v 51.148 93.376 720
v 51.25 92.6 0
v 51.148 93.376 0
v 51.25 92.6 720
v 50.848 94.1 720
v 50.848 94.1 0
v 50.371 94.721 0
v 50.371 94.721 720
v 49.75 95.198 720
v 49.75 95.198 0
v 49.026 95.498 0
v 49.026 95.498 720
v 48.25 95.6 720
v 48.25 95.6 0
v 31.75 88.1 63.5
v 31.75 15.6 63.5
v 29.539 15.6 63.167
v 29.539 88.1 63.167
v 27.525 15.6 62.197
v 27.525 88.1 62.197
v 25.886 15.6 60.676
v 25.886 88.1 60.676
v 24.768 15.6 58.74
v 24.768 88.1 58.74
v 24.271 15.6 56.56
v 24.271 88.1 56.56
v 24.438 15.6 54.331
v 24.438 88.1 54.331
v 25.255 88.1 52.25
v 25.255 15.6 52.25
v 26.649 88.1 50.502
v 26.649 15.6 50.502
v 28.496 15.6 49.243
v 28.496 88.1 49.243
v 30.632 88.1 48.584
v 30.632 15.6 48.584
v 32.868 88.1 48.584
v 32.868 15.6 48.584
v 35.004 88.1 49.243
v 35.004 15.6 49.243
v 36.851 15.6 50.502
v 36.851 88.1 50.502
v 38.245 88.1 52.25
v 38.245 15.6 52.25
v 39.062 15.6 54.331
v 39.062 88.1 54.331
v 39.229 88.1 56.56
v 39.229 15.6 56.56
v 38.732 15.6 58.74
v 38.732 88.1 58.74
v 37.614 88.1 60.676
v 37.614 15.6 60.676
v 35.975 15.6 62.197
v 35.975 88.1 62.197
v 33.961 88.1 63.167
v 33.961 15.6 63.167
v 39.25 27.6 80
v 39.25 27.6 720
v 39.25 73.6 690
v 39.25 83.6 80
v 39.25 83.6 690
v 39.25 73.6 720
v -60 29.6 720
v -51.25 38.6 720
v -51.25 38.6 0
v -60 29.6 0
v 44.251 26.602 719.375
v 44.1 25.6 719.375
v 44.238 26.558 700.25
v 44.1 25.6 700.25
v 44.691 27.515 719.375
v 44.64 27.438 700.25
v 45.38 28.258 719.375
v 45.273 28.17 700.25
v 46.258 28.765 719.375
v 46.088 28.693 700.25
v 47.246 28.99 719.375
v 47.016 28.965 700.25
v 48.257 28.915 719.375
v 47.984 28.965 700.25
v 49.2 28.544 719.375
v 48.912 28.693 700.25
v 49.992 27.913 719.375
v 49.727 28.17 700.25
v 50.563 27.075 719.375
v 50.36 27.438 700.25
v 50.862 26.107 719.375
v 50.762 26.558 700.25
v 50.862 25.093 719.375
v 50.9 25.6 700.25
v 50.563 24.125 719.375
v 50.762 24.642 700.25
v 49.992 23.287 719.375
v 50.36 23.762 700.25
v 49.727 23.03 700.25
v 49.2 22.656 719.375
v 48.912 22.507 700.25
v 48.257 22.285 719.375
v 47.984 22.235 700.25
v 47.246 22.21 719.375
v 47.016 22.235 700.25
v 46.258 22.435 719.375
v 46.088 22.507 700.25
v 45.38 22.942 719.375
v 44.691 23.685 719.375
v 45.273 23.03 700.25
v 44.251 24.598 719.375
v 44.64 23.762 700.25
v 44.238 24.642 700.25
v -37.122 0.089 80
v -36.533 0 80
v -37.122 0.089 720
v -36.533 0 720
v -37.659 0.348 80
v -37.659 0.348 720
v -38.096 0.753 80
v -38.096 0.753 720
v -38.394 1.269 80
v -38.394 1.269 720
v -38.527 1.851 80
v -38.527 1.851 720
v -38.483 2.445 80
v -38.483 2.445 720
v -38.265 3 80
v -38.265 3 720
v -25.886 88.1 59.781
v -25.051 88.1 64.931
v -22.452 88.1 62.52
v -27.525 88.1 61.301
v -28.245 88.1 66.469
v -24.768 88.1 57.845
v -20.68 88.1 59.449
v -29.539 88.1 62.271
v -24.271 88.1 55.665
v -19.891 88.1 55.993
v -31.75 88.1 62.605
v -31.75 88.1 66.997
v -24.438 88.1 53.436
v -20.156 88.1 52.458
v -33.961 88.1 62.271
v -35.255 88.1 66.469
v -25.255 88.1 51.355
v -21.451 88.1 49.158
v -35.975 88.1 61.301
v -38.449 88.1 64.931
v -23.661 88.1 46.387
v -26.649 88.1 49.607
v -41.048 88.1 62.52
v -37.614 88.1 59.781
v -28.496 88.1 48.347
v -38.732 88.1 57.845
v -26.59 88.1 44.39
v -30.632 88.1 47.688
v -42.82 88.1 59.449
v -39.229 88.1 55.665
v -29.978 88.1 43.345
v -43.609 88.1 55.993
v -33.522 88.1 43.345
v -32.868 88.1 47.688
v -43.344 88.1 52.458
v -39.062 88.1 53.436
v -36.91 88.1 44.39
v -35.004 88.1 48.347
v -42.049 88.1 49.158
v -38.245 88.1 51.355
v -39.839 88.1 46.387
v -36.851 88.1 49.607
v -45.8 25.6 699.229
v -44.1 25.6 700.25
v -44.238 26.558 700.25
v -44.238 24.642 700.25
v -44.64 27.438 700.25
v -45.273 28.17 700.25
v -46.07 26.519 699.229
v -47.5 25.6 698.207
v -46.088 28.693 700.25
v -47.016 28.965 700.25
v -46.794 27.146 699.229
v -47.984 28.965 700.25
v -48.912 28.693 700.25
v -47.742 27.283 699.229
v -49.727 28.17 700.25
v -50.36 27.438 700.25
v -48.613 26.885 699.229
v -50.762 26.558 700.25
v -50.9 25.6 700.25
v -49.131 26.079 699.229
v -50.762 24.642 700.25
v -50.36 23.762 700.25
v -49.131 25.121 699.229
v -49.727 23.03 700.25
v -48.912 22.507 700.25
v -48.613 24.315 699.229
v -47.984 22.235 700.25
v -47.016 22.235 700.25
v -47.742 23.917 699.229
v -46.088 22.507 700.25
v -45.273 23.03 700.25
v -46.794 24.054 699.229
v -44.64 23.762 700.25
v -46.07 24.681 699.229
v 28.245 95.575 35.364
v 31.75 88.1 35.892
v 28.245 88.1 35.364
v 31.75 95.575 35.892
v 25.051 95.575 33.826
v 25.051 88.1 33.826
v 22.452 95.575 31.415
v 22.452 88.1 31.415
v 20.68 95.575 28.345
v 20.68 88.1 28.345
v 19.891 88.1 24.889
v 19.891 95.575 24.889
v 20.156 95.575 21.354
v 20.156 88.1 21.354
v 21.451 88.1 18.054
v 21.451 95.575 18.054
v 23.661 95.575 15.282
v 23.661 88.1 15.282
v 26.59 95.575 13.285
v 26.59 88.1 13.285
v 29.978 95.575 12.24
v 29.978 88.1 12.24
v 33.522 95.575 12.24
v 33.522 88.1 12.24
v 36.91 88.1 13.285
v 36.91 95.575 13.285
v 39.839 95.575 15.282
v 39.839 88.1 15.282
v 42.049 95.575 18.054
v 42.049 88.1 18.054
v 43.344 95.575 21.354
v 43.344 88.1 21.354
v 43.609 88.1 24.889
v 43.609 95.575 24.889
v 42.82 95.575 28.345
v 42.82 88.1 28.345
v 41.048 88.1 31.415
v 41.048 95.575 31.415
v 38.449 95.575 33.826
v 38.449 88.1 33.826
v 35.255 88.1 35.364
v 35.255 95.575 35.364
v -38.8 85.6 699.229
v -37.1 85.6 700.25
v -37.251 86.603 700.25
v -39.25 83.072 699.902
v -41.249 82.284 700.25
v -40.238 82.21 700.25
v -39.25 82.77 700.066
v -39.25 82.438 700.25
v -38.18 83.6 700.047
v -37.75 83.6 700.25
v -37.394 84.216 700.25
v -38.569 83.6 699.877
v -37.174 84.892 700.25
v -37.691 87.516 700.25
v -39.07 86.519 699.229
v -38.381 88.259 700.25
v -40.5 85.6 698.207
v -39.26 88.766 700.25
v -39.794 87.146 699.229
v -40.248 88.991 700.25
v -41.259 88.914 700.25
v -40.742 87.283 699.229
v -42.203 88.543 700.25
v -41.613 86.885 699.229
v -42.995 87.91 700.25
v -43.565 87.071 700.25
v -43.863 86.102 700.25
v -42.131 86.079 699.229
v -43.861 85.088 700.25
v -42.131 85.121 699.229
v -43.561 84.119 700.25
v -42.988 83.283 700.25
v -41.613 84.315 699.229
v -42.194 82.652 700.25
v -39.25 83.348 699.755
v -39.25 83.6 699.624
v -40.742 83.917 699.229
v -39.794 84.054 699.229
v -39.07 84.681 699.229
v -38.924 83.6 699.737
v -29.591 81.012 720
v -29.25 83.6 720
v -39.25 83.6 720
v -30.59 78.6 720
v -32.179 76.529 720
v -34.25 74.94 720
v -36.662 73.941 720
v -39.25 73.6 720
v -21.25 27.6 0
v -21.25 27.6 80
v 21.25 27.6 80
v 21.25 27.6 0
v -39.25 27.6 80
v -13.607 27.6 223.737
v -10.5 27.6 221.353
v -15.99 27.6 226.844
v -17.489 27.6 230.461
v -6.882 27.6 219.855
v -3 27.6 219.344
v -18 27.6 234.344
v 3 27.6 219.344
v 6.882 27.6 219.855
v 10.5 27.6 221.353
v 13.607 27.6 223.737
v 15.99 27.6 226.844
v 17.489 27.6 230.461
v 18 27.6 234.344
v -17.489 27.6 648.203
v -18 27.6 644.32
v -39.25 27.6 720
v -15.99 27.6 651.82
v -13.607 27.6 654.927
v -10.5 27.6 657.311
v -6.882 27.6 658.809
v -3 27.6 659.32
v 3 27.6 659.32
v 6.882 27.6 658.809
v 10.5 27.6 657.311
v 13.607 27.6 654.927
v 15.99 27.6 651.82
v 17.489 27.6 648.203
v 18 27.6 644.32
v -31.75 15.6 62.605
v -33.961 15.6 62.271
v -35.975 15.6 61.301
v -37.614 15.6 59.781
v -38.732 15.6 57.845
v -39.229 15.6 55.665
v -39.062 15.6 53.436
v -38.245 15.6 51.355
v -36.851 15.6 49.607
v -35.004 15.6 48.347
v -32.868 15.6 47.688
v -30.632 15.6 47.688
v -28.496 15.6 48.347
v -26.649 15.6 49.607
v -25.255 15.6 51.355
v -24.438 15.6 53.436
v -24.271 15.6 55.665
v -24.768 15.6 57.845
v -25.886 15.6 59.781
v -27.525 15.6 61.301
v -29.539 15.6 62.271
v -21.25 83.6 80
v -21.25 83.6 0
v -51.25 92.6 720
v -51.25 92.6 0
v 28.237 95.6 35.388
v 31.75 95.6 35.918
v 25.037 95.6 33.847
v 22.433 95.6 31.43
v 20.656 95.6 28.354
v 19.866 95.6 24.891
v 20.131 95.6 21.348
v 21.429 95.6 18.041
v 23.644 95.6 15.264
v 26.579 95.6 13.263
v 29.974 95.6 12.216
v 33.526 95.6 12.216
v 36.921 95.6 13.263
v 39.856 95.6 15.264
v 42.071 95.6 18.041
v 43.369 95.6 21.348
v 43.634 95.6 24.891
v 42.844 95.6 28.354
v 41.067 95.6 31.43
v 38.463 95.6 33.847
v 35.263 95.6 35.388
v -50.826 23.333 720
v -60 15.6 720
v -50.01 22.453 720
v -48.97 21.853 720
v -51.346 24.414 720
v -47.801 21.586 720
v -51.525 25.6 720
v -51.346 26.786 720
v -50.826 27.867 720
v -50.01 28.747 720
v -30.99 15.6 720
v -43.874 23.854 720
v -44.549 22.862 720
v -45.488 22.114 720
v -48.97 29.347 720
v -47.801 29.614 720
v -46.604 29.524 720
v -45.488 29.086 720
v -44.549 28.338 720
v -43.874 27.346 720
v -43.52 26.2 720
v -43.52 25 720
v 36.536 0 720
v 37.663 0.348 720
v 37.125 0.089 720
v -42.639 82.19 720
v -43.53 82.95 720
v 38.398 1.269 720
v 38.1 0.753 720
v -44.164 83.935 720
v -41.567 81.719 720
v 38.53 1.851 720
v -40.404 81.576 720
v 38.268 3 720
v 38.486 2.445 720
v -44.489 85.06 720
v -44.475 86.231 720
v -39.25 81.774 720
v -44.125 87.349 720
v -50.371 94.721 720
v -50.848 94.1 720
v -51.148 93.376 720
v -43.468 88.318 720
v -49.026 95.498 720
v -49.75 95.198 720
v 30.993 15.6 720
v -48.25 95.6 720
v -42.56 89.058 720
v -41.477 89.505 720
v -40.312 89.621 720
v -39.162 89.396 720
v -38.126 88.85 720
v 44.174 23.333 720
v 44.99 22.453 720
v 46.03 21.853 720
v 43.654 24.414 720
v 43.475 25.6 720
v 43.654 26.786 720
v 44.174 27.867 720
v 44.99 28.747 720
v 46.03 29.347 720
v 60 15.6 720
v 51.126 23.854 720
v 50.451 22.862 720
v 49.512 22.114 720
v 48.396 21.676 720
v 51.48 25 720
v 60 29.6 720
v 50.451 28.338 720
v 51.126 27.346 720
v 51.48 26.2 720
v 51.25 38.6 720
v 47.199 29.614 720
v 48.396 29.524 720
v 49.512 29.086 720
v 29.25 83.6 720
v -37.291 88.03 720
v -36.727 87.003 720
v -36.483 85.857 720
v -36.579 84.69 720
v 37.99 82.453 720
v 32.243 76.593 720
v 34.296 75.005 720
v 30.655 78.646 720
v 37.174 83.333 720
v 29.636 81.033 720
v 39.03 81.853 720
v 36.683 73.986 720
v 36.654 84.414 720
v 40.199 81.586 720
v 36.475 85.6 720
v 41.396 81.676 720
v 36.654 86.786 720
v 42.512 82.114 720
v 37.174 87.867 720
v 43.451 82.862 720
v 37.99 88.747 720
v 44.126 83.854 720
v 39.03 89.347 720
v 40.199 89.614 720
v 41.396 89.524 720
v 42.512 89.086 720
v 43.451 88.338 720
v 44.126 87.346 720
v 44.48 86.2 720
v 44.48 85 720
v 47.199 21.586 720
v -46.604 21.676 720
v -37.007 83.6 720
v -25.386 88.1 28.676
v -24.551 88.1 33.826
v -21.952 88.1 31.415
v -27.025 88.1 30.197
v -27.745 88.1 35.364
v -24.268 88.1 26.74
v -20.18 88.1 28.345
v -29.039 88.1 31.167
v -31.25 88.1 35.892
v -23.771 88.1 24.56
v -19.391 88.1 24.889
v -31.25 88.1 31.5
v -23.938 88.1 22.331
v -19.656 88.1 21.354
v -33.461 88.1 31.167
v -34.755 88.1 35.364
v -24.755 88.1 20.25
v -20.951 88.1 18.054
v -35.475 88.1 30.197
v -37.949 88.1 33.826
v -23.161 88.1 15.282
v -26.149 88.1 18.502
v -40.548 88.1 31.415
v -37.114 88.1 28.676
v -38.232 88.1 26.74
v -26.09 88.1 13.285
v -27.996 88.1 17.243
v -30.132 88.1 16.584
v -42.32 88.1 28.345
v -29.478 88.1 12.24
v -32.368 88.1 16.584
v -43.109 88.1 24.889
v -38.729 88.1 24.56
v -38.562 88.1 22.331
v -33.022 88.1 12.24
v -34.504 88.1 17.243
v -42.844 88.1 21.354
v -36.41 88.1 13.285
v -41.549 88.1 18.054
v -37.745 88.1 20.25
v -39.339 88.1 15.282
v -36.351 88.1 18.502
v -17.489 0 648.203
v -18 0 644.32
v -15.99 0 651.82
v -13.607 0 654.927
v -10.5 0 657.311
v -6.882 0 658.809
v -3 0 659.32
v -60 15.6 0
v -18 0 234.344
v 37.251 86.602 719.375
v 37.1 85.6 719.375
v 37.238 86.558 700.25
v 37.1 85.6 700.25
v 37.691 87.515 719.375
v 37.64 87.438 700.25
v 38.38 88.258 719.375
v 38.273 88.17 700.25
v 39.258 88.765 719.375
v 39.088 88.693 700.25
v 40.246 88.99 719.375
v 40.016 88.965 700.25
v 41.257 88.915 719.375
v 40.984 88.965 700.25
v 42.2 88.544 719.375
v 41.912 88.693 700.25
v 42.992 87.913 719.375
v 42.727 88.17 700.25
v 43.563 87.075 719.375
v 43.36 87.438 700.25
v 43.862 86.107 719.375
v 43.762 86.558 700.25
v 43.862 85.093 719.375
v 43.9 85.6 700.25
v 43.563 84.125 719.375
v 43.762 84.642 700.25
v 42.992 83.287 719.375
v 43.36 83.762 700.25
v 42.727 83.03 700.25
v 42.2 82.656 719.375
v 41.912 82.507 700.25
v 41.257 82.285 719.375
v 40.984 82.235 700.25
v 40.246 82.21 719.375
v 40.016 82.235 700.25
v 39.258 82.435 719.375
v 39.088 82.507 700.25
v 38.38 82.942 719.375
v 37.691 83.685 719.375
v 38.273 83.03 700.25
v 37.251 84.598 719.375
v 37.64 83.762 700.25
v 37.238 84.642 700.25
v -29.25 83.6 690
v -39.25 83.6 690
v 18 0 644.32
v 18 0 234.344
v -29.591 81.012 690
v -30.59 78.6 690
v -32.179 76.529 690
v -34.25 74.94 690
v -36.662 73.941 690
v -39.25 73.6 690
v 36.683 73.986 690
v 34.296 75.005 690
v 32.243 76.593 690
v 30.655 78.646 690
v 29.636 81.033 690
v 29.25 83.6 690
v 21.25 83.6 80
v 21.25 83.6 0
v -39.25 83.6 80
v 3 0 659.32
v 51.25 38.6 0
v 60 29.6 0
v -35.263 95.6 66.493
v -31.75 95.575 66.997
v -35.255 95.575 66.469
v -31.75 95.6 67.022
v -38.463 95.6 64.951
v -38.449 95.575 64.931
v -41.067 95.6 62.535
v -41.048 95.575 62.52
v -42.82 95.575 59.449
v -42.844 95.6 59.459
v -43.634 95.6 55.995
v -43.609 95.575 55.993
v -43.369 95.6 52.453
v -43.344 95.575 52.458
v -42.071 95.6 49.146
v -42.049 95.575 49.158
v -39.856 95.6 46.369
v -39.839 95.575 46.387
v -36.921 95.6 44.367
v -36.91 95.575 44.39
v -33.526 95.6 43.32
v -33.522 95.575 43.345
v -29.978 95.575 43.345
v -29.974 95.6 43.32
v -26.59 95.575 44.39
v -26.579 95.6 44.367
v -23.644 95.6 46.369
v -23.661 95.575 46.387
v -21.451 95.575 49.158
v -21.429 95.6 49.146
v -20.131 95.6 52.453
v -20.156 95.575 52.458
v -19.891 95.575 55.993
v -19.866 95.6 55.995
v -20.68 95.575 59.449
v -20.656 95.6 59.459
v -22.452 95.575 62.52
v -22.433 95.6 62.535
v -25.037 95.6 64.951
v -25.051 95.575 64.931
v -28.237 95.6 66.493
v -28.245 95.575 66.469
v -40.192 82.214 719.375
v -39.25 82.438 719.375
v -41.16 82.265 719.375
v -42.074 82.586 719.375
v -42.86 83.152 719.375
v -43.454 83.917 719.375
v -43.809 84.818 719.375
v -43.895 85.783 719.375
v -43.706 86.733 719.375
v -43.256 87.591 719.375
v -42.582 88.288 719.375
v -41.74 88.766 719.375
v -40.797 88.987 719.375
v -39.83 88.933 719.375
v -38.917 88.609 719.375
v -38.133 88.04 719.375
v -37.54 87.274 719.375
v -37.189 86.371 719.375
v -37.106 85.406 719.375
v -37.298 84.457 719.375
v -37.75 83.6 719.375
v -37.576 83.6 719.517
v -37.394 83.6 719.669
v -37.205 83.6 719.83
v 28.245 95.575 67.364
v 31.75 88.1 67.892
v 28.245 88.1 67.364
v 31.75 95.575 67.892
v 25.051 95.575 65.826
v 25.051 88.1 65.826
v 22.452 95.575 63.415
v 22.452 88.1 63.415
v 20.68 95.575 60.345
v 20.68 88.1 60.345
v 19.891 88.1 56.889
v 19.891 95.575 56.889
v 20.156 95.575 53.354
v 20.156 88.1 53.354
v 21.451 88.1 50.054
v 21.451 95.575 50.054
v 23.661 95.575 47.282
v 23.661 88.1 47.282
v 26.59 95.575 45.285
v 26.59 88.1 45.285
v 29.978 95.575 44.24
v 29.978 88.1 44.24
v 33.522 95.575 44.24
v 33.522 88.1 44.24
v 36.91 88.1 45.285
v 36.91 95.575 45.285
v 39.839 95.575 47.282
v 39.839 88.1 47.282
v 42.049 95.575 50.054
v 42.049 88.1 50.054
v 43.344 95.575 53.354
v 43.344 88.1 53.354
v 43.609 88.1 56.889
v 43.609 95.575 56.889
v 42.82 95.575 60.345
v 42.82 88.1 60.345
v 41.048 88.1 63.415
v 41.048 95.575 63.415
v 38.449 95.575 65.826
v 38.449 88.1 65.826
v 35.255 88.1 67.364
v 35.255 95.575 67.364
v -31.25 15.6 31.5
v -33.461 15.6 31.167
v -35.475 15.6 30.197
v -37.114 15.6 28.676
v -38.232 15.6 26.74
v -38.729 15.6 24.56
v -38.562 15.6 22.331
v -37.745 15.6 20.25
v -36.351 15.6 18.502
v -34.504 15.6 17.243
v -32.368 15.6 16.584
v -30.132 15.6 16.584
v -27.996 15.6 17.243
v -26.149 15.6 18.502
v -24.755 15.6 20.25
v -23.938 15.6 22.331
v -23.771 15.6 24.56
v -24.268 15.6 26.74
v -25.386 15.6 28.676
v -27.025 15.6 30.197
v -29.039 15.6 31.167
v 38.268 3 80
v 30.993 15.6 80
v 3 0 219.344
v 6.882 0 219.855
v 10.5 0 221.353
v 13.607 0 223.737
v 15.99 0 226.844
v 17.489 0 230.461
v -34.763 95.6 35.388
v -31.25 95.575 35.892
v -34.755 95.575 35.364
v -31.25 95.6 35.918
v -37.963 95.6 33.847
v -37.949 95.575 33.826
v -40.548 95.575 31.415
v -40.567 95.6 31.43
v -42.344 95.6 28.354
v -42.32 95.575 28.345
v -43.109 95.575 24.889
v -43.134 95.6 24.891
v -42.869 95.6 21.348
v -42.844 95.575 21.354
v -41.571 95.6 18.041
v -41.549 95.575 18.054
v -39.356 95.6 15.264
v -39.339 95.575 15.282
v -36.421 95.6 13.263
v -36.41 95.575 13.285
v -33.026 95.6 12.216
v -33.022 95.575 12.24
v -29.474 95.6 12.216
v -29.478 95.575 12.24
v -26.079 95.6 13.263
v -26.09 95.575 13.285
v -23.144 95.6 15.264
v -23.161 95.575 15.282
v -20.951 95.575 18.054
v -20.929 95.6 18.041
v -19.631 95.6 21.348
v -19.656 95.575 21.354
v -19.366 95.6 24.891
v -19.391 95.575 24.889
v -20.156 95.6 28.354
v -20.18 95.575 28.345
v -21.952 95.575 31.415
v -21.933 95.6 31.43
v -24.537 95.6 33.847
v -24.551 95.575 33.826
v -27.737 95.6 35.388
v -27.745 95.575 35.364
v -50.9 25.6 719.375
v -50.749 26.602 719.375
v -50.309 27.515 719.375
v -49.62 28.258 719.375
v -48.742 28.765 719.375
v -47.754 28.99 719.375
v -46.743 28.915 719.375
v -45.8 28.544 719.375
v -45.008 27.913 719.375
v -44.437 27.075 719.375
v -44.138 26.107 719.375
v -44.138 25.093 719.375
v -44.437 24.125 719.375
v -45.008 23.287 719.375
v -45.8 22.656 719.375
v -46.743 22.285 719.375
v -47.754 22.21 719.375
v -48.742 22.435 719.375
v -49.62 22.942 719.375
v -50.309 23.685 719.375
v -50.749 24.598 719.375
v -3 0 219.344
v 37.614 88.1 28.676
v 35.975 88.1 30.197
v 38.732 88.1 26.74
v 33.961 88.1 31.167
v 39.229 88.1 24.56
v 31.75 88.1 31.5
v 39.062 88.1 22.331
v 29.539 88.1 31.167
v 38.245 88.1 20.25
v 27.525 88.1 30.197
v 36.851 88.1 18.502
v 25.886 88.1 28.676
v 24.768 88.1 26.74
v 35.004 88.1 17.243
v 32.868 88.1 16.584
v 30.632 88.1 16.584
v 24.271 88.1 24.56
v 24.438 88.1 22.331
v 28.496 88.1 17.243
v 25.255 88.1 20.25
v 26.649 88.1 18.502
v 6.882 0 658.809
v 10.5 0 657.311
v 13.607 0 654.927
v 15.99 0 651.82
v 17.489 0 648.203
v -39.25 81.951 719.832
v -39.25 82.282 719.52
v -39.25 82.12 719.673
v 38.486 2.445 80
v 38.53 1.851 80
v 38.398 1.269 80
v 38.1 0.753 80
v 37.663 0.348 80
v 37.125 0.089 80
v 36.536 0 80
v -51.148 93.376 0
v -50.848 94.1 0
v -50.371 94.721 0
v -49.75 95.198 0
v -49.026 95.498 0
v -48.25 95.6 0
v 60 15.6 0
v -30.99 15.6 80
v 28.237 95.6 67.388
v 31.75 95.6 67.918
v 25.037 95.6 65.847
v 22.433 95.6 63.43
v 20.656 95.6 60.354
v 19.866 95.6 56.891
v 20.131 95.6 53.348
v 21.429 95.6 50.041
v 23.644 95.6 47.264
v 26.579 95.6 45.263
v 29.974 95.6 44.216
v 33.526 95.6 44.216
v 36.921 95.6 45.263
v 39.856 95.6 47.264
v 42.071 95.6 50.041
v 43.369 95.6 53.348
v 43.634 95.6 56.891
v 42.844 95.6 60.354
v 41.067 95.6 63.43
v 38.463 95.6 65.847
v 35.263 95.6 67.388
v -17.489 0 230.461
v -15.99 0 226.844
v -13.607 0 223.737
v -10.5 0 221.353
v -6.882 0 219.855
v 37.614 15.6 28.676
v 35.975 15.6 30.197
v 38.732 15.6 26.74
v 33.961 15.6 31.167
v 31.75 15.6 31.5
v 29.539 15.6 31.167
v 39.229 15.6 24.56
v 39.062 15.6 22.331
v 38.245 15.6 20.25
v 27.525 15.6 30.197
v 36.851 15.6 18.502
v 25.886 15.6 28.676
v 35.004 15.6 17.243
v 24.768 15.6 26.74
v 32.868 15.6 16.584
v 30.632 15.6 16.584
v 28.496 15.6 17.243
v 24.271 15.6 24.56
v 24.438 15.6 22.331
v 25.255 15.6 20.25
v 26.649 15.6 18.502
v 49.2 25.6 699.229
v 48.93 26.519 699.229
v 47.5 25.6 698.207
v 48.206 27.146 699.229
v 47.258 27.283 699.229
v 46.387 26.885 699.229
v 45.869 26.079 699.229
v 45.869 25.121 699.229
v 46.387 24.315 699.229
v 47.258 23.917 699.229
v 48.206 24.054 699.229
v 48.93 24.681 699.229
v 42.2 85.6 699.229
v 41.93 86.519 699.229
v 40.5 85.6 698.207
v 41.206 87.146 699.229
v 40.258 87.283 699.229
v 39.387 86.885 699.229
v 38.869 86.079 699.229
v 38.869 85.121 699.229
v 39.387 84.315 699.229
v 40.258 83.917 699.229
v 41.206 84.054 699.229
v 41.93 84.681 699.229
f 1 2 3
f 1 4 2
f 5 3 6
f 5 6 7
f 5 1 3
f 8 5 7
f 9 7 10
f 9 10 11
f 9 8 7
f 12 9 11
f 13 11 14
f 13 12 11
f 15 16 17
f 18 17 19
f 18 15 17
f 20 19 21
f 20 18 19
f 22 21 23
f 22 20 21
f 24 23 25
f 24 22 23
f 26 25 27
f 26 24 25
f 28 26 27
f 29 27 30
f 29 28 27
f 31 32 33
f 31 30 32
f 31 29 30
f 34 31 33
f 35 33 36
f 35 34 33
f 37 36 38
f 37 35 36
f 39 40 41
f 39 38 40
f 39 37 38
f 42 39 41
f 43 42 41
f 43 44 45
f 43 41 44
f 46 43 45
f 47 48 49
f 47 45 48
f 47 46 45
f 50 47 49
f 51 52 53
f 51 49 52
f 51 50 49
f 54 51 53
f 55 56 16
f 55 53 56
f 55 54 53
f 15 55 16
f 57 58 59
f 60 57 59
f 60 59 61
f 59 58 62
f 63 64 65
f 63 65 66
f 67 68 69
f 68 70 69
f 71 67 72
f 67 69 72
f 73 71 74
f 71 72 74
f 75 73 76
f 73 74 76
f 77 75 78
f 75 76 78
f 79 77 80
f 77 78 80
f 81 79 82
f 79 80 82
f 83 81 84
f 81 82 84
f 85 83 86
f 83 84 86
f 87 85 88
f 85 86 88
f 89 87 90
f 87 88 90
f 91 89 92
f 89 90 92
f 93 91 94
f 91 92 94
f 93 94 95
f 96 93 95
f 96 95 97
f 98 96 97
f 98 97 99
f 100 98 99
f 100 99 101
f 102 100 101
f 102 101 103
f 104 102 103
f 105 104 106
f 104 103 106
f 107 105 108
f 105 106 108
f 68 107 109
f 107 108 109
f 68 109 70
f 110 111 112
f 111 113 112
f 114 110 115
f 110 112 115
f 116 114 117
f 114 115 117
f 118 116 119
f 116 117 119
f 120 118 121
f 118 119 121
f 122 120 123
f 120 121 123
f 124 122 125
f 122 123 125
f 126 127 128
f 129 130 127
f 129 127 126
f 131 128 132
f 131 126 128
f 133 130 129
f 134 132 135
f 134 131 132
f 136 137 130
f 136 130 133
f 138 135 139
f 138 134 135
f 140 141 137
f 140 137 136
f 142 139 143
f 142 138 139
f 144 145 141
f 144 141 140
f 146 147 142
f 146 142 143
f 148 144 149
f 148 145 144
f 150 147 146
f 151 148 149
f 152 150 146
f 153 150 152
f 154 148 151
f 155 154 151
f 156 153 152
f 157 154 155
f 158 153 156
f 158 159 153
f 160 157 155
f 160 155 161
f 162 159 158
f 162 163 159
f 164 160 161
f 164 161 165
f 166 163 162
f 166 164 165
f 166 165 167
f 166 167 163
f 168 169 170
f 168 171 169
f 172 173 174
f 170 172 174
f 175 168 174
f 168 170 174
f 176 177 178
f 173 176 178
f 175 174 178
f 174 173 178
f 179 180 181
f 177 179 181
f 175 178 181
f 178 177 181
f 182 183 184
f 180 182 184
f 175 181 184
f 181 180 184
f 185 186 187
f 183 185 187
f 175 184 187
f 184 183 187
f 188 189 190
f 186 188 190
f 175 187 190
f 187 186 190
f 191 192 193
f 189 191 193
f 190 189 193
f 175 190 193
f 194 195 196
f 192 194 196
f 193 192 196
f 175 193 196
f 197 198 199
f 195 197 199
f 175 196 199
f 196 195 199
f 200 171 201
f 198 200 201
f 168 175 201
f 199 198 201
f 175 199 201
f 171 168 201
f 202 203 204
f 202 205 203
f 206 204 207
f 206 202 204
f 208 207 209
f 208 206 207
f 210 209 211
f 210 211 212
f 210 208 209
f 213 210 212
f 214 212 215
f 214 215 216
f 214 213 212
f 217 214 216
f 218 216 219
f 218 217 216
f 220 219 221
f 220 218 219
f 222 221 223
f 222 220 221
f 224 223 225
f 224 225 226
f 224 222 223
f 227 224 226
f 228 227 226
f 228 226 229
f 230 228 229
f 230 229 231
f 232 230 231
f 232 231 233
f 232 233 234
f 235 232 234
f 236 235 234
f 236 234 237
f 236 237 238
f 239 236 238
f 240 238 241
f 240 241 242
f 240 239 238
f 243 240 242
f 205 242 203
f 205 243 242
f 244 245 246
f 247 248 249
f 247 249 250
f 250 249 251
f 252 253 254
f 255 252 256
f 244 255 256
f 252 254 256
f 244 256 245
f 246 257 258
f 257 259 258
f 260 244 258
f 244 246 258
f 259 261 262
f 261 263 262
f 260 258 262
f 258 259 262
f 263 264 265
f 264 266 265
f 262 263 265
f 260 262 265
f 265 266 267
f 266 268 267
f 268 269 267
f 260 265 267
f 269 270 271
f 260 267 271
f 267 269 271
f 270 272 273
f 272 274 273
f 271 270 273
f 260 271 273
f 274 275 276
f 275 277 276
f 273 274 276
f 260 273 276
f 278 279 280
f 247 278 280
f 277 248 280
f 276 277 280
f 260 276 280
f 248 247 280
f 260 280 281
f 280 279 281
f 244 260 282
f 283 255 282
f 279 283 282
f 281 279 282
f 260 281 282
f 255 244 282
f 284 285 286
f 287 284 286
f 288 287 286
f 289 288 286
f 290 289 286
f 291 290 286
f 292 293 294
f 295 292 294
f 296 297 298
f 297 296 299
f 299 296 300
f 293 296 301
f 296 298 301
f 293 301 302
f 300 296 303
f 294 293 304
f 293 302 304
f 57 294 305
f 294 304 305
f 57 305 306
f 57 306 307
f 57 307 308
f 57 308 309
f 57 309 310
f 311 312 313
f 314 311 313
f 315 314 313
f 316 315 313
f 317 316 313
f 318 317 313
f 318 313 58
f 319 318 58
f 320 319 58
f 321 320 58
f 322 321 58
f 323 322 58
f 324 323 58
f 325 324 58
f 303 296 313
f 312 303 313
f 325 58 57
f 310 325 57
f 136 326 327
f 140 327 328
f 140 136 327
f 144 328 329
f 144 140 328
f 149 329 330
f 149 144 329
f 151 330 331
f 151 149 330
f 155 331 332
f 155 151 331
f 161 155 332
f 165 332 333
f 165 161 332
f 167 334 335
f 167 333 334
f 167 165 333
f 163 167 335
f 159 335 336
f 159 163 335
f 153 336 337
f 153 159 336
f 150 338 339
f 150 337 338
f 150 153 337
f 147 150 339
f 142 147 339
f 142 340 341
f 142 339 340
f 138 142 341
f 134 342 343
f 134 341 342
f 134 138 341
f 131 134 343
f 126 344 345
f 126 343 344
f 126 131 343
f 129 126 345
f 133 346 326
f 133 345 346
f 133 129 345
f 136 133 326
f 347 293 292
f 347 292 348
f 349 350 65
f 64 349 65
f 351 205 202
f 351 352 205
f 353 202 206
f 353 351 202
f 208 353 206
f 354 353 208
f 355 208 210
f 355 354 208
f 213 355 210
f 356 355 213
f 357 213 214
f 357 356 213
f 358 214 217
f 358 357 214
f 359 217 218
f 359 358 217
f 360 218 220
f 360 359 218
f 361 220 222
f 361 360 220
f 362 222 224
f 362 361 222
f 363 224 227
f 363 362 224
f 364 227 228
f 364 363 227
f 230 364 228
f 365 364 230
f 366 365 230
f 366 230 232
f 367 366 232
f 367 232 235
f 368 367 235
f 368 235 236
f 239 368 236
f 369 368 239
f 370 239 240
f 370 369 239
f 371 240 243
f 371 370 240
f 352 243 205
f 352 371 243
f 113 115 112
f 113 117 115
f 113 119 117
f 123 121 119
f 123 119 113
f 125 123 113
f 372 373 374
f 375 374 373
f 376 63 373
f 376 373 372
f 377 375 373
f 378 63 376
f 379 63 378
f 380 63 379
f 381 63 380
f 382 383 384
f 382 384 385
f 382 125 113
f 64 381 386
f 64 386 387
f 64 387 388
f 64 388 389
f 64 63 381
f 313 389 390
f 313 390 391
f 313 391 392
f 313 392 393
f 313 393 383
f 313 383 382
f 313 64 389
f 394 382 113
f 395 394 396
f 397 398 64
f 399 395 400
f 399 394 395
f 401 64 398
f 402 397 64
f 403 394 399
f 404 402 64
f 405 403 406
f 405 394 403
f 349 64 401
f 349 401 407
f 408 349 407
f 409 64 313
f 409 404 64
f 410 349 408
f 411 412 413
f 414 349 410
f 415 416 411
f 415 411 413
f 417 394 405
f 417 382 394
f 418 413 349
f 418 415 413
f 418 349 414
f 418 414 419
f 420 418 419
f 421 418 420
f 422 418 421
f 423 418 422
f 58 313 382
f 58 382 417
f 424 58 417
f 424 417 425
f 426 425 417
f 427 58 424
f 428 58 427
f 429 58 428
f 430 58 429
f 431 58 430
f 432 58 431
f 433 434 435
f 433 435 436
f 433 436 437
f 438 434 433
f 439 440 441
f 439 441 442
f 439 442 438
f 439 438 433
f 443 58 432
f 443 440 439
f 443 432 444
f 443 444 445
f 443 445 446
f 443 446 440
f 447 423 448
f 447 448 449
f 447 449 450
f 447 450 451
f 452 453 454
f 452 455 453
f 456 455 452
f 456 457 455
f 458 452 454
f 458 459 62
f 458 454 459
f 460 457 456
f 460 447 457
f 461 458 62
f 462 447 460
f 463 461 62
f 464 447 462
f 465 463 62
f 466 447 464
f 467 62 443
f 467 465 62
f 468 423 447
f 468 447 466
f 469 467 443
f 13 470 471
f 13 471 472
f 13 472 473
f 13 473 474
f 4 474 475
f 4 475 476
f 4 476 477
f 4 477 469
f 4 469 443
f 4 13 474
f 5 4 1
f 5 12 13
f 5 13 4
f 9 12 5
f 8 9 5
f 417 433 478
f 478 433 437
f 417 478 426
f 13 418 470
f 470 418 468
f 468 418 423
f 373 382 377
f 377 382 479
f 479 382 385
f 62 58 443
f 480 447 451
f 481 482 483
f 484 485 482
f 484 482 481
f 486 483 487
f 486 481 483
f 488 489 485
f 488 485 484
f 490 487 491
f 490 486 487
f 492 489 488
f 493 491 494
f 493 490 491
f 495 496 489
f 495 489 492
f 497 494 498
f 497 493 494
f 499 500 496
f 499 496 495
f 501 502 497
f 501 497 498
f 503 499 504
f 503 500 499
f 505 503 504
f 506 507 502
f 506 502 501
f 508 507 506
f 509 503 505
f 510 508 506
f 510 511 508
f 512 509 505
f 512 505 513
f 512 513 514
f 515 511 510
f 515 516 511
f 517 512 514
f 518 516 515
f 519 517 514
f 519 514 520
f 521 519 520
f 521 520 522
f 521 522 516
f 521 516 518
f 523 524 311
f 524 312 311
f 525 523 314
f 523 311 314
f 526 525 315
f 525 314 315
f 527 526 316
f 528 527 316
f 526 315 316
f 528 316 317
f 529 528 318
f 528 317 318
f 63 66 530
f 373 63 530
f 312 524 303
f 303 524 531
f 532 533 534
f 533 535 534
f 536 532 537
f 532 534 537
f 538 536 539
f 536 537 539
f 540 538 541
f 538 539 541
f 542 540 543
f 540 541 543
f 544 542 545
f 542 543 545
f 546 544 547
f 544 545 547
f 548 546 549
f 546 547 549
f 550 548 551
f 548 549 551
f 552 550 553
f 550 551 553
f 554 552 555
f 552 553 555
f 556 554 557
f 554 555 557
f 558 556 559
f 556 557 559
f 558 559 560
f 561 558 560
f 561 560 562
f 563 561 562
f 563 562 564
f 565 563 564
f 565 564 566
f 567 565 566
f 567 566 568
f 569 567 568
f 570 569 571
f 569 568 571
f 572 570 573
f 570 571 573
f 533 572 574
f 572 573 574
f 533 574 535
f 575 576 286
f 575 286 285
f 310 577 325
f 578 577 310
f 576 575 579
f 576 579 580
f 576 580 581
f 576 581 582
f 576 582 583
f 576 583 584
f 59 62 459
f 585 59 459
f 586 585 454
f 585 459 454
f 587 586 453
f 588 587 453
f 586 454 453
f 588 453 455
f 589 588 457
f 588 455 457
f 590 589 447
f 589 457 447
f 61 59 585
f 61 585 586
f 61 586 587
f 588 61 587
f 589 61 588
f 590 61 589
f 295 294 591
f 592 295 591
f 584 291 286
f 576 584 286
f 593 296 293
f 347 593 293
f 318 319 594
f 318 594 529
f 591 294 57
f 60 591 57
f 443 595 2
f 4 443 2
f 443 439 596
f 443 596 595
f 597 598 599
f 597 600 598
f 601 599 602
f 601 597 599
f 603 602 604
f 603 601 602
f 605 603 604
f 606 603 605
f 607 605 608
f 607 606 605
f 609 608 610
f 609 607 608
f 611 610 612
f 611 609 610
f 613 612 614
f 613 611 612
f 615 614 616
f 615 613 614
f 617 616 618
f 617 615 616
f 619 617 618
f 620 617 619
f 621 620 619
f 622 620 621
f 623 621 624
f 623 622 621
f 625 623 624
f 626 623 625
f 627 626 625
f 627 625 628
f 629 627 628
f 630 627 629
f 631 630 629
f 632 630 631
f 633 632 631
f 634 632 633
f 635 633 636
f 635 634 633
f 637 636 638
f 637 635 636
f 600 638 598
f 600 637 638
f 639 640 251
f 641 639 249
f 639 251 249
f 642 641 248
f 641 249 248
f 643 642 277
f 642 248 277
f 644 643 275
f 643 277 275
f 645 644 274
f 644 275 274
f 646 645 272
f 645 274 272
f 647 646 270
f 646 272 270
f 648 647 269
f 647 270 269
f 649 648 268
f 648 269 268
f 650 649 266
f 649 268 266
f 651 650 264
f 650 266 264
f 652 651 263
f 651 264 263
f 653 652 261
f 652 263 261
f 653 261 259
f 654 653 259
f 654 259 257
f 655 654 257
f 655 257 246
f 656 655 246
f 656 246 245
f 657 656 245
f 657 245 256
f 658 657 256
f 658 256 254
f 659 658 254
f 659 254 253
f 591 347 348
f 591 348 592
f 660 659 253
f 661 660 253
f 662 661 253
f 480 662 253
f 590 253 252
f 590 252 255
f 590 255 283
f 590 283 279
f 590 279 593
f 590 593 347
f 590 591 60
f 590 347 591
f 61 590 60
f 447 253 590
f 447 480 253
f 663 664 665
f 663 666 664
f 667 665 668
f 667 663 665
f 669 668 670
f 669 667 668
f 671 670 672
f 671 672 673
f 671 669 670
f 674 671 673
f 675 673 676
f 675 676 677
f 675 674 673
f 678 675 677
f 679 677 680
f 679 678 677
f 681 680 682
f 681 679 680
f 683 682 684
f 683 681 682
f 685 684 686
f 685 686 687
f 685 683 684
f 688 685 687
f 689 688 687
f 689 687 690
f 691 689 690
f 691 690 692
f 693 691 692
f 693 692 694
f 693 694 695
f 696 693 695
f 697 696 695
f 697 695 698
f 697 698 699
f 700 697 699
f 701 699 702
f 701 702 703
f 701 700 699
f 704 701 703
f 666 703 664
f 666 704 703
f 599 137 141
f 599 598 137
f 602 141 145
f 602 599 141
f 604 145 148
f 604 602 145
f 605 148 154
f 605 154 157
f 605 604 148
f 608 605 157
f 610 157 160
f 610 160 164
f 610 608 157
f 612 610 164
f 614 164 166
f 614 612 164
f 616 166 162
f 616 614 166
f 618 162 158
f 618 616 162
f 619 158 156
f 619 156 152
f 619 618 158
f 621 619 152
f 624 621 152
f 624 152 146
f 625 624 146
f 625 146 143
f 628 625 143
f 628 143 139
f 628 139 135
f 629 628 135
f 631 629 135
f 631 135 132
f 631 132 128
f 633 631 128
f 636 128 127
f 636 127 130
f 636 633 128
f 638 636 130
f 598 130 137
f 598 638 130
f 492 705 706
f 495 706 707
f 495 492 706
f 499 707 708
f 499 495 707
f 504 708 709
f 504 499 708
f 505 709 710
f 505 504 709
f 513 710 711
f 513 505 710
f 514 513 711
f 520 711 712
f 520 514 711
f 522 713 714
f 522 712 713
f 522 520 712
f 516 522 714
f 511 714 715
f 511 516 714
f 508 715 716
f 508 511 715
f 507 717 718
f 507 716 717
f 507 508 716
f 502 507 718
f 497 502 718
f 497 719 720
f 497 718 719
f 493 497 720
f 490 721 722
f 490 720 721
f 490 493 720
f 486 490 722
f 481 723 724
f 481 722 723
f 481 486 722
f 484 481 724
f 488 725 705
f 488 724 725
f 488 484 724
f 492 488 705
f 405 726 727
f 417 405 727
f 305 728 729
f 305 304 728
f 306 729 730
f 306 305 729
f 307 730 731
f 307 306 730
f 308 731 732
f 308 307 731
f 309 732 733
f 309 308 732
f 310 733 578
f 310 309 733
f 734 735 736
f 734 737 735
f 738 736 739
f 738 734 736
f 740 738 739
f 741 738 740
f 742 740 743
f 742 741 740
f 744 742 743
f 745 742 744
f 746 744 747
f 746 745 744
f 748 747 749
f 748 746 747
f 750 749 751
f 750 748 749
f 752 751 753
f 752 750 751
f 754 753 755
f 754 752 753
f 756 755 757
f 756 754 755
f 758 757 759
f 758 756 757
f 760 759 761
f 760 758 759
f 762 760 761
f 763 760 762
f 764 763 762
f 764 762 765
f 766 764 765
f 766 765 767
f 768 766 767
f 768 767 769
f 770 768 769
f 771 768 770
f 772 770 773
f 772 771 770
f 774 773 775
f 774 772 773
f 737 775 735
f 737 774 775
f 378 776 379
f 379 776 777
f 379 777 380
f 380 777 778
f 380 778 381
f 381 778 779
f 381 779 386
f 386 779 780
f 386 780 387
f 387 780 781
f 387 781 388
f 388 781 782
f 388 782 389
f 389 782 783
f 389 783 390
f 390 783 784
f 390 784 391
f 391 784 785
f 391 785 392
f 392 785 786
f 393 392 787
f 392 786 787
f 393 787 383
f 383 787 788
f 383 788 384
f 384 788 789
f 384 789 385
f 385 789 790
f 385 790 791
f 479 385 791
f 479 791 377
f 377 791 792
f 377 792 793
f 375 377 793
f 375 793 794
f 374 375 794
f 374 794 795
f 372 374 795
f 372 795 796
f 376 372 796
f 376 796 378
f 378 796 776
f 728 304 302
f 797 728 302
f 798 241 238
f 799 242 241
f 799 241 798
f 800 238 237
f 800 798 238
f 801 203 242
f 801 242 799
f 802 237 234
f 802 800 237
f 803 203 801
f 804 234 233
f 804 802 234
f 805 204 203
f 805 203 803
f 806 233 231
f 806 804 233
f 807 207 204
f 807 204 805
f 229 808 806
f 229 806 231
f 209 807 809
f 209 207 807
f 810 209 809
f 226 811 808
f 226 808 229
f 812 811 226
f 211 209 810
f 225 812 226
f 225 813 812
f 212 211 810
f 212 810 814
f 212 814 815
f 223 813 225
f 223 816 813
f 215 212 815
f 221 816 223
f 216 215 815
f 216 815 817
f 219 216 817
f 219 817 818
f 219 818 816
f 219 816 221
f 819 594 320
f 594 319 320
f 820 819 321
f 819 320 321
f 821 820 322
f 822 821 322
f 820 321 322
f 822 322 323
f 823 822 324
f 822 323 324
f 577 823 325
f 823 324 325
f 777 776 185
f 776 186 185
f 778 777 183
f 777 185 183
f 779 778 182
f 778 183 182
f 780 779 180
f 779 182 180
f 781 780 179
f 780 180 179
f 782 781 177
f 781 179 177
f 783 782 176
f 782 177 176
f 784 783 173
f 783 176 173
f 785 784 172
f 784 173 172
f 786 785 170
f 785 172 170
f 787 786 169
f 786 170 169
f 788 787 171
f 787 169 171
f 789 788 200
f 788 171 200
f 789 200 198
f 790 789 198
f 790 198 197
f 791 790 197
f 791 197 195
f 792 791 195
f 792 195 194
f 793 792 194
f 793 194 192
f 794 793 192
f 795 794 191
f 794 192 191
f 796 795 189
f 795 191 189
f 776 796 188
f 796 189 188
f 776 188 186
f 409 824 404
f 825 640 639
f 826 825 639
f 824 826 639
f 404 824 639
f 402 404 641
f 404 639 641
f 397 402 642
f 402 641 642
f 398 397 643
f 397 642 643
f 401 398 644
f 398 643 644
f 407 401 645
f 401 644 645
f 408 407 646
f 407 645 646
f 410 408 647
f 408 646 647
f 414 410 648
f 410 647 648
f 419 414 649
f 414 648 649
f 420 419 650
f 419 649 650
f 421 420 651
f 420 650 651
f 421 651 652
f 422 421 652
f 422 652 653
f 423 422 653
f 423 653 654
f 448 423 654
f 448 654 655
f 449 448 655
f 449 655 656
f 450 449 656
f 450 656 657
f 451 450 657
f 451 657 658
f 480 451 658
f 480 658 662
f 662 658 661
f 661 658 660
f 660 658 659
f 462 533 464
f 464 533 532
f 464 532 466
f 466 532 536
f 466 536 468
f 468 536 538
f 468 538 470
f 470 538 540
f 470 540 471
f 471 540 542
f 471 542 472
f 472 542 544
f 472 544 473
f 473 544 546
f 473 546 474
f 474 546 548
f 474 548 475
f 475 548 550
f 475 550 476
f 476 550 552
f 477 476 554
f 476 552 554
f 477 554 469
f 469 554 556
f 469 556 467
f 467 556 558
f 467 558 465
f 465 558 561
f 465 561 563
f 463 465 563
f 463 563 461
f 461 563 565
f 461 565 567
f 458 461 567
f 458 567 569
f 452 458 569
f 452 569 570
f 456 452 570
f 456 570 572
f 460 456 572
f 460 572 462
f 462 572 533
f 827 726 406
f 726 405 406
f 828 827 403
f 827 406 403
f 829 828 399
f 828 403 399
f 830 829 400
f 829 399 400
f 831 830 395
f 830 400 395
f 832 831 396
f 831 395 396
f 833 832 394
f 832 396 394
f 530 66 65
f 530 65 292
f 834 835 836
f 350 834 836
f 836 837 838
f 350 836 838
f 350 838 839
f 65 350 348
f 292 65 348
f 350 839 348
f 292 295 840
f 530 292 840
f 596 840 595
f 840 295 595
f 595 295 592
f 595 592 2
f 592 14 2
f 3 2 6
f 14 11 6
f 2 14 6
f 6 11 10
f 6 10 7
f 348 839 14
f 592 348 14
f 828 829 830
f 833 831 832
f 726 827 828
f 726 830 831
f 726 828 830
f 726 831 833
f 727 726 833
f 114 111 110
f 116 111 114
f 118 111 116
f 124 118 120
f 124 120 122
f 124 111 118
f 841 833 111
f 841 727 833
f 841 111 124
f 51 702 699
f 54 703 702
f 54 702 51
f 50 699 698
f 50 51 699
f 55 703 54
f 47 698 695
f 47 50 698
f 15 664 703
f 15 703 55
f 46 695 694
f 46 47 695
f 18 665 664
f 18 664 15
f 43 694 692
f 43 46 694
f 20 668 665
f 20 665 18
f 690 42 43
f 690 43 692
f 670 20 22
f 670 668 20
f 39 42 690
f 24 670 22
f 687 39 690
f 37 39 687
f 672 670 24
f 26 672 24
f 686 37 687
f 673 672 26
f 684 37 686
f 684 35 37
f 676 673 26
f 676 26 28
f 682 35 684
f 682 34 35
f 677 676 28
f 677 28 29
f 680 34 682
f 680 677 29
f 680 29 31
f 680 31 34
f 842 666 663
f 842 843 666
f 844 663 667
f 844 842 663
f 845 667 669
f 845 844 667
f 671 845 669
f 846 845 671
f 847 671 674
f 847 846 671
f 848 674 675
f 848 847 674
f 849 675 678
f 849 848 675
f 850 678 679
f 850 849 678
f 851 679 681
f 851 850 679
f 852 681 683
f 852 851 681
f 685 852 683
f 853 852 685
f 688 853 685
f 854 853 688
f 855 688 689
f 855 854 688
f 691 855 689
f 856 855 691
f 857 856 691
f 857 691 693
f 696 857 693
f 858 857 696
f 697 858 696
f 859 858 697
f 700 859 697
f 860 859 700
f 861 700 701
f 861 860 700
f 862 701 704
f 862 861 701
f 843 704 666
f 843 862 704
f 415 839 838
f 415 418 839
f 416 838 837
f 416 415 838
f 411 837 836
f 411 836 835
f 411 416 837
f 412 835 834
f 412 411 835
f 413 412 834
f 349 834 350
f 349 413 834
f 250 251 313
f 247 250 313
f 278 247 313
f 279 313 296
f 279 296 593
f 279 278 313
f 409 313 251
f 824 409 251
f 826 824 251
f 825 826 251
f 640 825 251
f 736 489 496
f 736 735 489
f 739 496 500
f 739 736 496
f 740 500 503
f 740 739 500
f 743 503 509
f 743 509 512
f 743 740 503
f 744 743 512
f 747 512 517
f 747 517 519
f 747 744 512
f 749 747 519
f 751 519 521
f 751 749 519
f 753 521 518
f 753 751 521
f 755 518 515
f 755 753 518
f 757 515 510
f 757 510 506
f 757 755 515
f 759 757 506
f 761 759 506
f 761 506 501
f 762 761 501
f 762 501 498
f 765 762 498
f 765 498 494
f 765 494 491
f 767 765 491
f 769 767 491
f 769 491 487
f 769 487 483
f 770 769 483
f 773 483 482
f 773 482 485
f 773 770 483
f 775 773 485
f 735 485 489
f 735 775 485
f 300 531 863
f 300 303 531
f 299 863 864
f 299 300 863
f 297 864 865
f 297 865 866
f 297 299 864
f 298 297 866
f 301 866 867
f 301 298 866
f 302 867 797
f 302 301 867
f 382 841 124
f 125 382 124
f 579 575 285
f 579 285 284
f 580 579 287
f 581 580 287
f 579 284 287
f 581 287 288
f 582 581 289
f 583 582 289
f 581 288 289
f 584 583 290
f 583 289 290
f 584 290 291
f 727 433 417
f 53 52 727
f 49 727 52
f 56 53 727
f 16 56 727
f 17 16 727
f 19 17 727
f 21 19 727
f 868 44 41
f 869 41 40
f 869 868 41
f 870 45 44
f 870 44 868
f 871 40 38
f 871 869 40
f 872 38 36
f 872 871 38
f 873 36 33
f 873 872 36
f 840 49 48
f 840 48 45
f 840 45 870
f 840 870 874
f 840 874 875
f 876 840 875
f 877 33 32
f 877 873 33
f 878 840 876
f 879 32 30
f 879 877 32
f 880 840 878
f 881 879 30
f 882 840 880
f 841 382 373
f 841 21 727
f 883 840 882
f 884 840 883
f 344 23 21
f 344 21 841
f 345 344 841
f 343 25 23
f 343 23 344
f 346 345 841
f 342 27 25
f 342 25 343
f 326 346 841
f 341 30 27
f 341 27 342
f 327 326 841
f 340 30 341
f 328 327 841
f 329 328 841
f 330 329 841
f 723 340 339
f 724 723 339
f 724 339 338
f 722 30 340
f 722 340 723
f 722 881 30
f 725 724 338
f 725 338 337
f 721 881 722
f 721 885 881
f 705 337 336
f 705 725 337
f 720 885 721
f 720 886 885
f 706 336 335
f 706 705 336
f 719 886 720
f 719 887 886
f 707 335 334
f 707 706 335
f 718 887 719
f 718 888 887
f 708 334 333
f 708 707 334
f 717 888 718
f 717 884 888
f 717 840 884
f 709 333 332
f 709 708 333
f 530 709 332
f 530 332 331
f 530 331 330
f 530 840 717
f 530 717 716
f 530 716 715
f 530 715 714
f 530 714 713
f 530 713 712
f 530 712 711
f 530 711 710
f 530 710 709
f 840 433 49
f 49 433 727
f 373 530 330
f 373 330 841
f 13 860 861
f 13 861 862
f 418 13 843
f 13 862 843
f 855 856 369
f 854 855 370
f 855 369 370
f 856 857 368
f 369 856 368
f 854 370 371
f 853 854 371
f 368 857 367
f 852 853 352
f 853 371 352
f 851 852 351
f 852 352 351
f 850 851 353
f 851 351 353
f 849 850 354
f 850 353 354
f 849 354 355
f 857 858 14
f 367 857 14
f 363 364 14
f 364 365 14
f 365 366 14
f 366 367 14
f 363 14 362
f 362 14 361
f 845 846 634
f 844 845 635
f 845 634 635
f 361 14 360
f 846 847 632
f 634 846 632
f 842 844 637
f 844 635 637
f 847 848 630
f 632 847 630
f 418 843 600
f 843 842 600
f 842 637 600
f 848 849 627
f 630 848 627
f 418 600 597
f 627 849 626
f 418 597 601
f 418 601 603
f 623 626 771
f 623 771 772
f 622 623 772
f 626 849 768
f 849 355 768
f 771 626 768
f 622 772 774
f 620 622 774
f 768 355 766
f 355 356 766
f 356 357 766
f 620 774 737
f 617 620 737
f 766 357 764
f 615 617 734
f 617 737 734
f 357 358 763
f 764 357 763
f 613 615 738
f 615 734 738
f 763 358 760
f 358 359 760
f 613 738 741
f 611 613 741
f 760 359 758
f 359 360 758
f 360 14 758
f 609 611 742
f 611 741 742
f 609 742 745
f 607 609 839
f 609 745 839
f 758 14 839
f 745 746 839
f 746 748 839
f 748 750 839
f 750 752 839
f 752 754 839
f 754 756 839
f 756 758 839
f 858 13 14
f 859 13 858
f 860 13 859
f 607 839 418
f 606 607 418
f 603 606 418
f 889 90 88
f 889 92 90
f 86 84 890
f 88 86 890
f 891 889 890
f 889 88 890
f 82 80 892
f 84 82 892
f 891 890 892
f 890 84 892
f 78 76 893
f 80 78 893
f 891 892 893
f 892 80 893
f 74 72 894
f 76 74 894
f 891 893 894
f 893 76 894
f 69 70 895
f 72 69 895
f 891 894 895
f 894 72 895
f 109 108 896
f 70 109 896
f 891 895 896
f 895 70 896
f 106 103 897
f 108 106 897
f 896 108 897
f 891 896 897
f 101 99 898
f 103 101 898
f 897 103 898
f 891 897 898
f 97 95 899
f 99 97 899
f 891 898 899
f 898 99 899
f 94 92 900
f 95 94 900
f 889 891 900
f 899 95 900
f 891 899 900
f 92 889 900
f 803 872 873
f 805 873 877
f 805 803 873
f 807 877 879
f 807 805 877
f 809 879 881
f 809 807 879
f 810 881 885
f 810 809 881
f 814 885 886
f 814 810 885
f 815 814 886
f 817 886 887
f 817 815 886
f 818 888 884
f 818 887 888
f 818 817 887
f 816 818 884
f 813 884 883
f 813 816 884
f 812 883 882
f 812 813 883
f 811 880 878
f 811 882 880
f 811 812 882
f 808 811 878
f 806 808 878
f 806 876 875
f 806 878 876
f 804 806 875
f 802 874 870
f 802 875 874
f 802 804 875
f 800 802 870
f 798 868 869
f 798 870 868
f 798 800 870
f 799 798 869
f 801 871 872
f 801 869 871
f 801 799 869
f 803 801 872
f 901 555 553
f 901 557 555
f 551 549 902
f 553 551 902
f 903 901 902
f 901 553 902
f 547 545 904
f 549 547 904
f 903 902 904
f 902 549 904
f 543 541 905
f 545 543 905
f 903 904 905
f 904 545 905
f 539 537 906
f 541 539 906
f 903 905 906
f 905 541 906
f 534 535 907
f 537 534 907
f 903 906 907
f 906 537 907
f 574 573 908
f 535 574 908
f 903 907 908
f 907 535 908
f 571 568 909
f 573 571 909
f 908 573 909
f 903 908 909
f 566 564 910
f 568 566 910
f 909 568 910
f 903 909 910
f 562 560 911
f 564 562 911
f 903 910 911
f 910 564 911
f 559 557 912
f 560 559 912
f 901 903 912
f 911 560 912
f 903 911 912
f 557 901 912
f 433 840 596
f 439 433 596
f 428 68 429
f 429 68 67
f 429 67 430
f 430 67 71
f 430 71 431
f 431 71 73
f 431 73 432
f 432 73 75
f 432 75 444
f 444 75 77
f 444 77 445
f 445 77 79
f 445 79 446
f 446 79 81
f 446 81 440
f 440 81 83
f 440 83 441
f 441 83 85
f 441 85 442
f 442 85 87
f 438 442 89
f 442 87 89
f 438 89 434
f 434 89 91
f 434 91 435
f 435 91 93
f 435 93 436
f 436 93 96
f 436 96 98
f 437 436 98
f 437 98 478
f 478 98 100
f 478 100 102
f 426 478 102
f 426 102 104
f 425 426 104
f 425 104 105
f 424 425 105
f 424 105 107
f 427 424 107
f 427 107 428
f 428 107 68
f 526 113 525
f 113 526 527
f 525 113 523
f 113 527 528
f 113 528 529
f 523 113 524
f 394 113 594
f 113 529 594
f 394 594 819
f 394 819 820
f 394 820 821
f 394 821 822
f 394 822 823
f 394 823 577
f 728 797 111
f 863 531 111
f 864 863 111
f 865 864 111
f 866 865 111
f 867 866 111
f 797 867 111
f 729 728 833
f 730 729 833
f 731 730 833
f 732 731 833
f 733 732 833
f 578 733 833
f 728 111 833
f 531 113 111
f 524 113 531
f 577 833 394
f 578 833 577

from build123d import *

# Parameters (mm, degrees)
BOSS_EXTRUDE1_DEPTH                     = 720
SKETCH2_W                               = 80.883152422
SKETCH2_H                               = 15.6
CUT_EXTRUDE1_DEPTH                      = 80
CBORE_FOR_M12_HEX_HEAD_BOLT1_AT_2_COUNT = 2
CBORE_FOR_M12_HEX_HEAD_BOLT1_AT_2_PITCH = 63
CBORE_FOR_M12_HEX_HEAD_BOLT2_AT_2_COUNT = 2
CBORE_FOR_M12_HEX_HEAD_BOLT2_AT_2_PITCH = 63.506311734
SKETCH8_W                               = 78.5
SKETCH8_H                               = 56
CUT_EXTRUDE2_DEPTH                      = 640
SKETCH9_W                               = 42.5
SKETCH9_H                               = 56
CUT_EXTRUDE3_DEPTH                      = 90
BOSS_EXTRUDE3_DEPTH                     = 30
M8_TAPPED_HOLE1_D                       = 6.8
M8_TAPPED_HOLE1_DEPTH                   = 19.75
M8_TAPPED_HOLE1_CSINK_D                 = 8.05
M8_TAPPED_HOLE1_CSINK_ANGLE             = 90
M8_TAPPED_HOLE1_TIP                     = 2.042926105
M8_TAPPED_HOLE2_D                       = 6.8
M8_TAPPED_HOLE2_DEPTH                   = 19.75
M8_TAPPED_HOLE2_CSINK_D                 = 8.05
M8_TAPPED_HOLE2_CSINK_ANGLE             = 90
M8_TAPPED_HOLE2_TIP                     = 2.042926105
SKETCH16_W                              = 36
SKETCH16_H                              = 439.976552226
CUT_EXTRUDE4_DEPTH                      = 30
FILLET1_R                               = 15
FILLET2_R                               = 15
FILLET3_R                               = 15
FILLET4_R                               = 15
FILLET5_R                               = 3
FILLET6_R                               = 3
FILLET7_R                               = 2
FILLET8_R                               = 2
BOSS_EXTRUDE4_DEPTH                     = 30


with BuildPart() as part:
    # Sketch1 → Boss-Extrude1 (new body)
    with BuildSketch(Plane.XY):
        Polygon((-39.996837695, 0), (40, 0), (30.993335801, 15.6), (60, 15.6), (60, 29.6), (51.25, 38.6), (51.25, 95.6), (-51.25, 95.6), (-51.25, 38.6), (-60, 29.6), (-60, 15.6), (-30.990173495, 15.6), align=None)
    extrude(amount=BOSS_EXTRUDE1_DEPTH)

    # Sketch2 → Cut-Extrude1 (cut)
    with BuildSketch(Plane(origin=(0, 0, 0), x_dir=(-1, 0, 0), z_dir=(0, 0, -1))):
        with Locations((0.441576211, 7.8)):
            Rectangle(SKETCH2_W, SKETCH2_H)
    extrude(amount=-CUT_EXTRUDE1_DEPTH, mode=Mode.SUBTRACT)

    # Sketch6 → CBORE for M12 Hex Head Bolt1 (revolve, cut)
    with BuildSketch(Plane(origin=(31.75, 95.6, 24), x_dir=(0, 0, 1), z_dir=(1, 0, 0))):
        Polygon((0, 0), (0, 95.6), (7.5, 95.6), (7.5, 7.5), (11.8925, 7.5), (11.8925, 0.025), (11.9175, 0), align=None)
    cbore_for_m12_hex_head_bolt1 = revolve(axis=Axis((31.75, 101.95, 24), (0, -1, 0)), mode=Mode.SUBTRACT)

    # CBORE for M12 Hex Head Bolt1 at 2: CBORE for M12 Hex Head Bolt1 ×2
    with Locations(*[(-i * CBORE_FOR_M12_HEX_HEAD_BOLT1_AT_2_PITCH, 0, 0) for i in range(1, CBORE_FOR_M12_HEX_HEAD_BOLT1_AT_2_COUNT)]):
        add(cbore_for_m12_hex_head_bolt1, mode=Mode.SUBTRACT)

    # Sketch7 → CBORE for M12 Hex Head Bolt2 (revolve, cut)
    with BuildSketch(Plane(origin=(31.75, 95.6, 56), x_dir=(0, 0, 1), z_dir=(1, 0, 0))):
        Polygon((0, 0), (0, 95.6), (7.5, 95.6), (7.5, 7.5), (11.8925, 7.5), (11.8925, 0.025), (11.9175, 0), align=None)
    cbore_for_m12_hex_head_bolt2 = revolve(axis=Axis((31.75, 101.95, 56), (0, -1, 0)), mode=Mode.SUBTRACT)

    # CBORE for M12 Hex Head Bolt2 at 2: CBORE for M12 Hex Head Bolt2 ×2
    with Locations(*[Vector(-0.999900612489988, 0, -0.014098409206251253) * (i * CBORE_FOR_M12_HEX_HEAD_BOLT2_AT_2_PITCH) for i in range(1, CBORE_FOR_M12_HEX_HEAD_BOLT2_AT_2_COUNT)]):
        add(cbore_for_m12_hex_head_bolt2, mode=Mode.SUBTRACT)

    # Sketch8 → Cut-Extrude2 (cut)
    with BuildSketch(Plane.XY.offset(720)):
        with Locations((0, 55.6)):
            Rectangle(SKETCH8_W, SKETCH8_H)
    extrude(amount=-CUT_EXTRUDE2_DEPTH, mode=Mode.SUBTRACT)

    # Sketch9 → Cut-Extrude3 (cut)
    with BuildSketch(Plane.XY.offset(80)):
        with Locations((0, 55.6)):
            Rectangle(SKETCH9_W, SKETCH9_H)
    extrude(amount=-CUT_EXTRUDE3_DEPTH, mode=Mode.SUBTRACT)

    # Sketch12 → Boss-Extrude3 (add)
    with BuildSketch(Plane.XY.offset(720)):
        with BuildLine():
            Line((29.25, 83.6), (39.473976763, 83.823976763))
            Line((39.473976763, 83.823976763), (39.25, 73.6))
            ThreePointArc((39.25, 73.6), (32.242798905, 76.592798905), (29.25, 83.6))
        make_face()
    extrude(amount=-BOSS_EXTRUDE3_DEPTH)

    # M8 Tapped Hole1
    with Locations(Plane(origin=(-40.5, 85.6, 720), x_dir=(1, 0, 0), z_dir=(0, 0, 1))):
        with Locations((0, 0), (81, 0)):
            CounterSinkHole(M8_TAPPED_HOLE1_D / 2, M8_TAPPED_HOLE1_CSINK_D / 2, depth=M8_TAPPED_HOLE1_DEPTH, counter_sink_angle=M8_TAPPED_HOLE1_CSINK_ANGLE)
            with Locations((0, 0, -(M8_TAPPED_HOLE1_DEPTH + M8_TAPPED_HOLE1_TIP / 2))):  # 118° drill point
                Cone(0, M8_TAPPED_HOLE1_D / 2, M8_TAPPED_HOLE1_TIP, mode=Mode.SUBTRACT)

    # M8 Tapped Hole2
    with Locations(Plane(origin=(-47.5, 25.6, 720), x_dir=(1, 0, 0), z_dir=(0, 0, 1))):
        with Locations((0, 0), (95, 0)):
            CounterSinkHole(M8_TAPPED_HOLE2_D / 2, M8_TAPPED_HOLE2_CSINK_D / 2, depth=M8_TAPPED_HOLE2_DEPTH, counter_sink_angle=M8_TAPPED_HOLE2_CSINK_ANGLE)
            with Locations((0, 0, -(M8_TAPPED_HOLE2_DEPTH + M8_TAPPED_HOLE2_TIP / 2))):  # 118° drill point
                Cone(0, M8_TAPPED_HOLE2_D / 2, M8_TAPPED_HOLE2_TIP, mode=Mode.SUBTRACT)

    # Sketch16 → Cut-Extrude4 (cut)
    with BuildSketch(Plane(origin=(0, 0, 0), x_dir=(-1, 0, 0), z_dir=(0, -1, 0))):
        with Locations((0, -439.332055324)):
            Rectangle(SKETCH16_W, SKETCH16_H)
    extrude(amount=-CUT_EXTRUDE4_DEPTH, mode=Mode.SUBTRACT)

    # Fillet1
    fillet1_edges = [part.edges().sort_by_distance(p)[0] for p in [
        (-18, 13.8, 659.320331437),
    ]]
    fillet(fillet1_edges, radius=FILLET1_R)

    # Fillet2
    fillet2_edges = [part.edges().sort_by_distance(p)[0] for p in [
        (18, 13.8, 659.320331437),
    ]]
    fillet(fillet2_edges, radius=FILLET2_R)

    # Fillet3
    fillet3_edges = [part.edges().sort_by_distance(p)[0] for p in [
        (-18, 13.8, 219.343779211),
    ]]
    fillet(fillet3_edges, radius=FILLET3_R)

    # Fillet4
    fillet4_edges = [part.edges().sort_by_distance(p)[0] for p in [
        (18, 13.8, 219.343779211),
    ]]
    fillet(fillet4_edges, radius=FILLET4_R)

    # Fillet5
    fillet5_edges = [part.edges().sort_by_distance(p)[0] for p in [
        (51.25, 95.6, 360),
    ]]
    fillet(fillet5_edges, radius=FILLET5_R)

    # Fillet6
    fillet6_edges = [part.edges().sort_by_distance(p)[0] for p in [
        (-51.25, 95.6, 360),
    ]]
    fillet(fillet6_edges, radius=FILLET6_R)

    # Fillet7
    fillet7_edges = [part.edges().sort_by_distance(p)[0] for p in [
        (40, 0, 400),
    ]]
    fillet(fillet7_edges, radius=FILLET7_R)

    # Fillet8
    fillet8_edges = [part.edges().sort_by_distance(p)[0] for p in [
        (-39.996837695, 0, 400),
    ]]
    fillet(fillet8_edges, radius=FILLET8_R)


with BuildPart() as body_2:
    # Sketch17 → Boss-Extrude4 (new body)
    with BuildSketch(Plane.XY.offset(720)):
        with BuildLine():
            Line((-39.25, 73.6), (-39.25, 83.6))
            Line((-39.25, 83.6), (-29.25, 83.6))
            ThreePointArc((-29.25, 83.6), (-32.178932188, 76.528932188), (-39.25, 73.6))
        make_face()
    extrude(amount=-BOSS_EXTRUDE4_DEPTH)


solid = Compound([part.part, body_2.part])
